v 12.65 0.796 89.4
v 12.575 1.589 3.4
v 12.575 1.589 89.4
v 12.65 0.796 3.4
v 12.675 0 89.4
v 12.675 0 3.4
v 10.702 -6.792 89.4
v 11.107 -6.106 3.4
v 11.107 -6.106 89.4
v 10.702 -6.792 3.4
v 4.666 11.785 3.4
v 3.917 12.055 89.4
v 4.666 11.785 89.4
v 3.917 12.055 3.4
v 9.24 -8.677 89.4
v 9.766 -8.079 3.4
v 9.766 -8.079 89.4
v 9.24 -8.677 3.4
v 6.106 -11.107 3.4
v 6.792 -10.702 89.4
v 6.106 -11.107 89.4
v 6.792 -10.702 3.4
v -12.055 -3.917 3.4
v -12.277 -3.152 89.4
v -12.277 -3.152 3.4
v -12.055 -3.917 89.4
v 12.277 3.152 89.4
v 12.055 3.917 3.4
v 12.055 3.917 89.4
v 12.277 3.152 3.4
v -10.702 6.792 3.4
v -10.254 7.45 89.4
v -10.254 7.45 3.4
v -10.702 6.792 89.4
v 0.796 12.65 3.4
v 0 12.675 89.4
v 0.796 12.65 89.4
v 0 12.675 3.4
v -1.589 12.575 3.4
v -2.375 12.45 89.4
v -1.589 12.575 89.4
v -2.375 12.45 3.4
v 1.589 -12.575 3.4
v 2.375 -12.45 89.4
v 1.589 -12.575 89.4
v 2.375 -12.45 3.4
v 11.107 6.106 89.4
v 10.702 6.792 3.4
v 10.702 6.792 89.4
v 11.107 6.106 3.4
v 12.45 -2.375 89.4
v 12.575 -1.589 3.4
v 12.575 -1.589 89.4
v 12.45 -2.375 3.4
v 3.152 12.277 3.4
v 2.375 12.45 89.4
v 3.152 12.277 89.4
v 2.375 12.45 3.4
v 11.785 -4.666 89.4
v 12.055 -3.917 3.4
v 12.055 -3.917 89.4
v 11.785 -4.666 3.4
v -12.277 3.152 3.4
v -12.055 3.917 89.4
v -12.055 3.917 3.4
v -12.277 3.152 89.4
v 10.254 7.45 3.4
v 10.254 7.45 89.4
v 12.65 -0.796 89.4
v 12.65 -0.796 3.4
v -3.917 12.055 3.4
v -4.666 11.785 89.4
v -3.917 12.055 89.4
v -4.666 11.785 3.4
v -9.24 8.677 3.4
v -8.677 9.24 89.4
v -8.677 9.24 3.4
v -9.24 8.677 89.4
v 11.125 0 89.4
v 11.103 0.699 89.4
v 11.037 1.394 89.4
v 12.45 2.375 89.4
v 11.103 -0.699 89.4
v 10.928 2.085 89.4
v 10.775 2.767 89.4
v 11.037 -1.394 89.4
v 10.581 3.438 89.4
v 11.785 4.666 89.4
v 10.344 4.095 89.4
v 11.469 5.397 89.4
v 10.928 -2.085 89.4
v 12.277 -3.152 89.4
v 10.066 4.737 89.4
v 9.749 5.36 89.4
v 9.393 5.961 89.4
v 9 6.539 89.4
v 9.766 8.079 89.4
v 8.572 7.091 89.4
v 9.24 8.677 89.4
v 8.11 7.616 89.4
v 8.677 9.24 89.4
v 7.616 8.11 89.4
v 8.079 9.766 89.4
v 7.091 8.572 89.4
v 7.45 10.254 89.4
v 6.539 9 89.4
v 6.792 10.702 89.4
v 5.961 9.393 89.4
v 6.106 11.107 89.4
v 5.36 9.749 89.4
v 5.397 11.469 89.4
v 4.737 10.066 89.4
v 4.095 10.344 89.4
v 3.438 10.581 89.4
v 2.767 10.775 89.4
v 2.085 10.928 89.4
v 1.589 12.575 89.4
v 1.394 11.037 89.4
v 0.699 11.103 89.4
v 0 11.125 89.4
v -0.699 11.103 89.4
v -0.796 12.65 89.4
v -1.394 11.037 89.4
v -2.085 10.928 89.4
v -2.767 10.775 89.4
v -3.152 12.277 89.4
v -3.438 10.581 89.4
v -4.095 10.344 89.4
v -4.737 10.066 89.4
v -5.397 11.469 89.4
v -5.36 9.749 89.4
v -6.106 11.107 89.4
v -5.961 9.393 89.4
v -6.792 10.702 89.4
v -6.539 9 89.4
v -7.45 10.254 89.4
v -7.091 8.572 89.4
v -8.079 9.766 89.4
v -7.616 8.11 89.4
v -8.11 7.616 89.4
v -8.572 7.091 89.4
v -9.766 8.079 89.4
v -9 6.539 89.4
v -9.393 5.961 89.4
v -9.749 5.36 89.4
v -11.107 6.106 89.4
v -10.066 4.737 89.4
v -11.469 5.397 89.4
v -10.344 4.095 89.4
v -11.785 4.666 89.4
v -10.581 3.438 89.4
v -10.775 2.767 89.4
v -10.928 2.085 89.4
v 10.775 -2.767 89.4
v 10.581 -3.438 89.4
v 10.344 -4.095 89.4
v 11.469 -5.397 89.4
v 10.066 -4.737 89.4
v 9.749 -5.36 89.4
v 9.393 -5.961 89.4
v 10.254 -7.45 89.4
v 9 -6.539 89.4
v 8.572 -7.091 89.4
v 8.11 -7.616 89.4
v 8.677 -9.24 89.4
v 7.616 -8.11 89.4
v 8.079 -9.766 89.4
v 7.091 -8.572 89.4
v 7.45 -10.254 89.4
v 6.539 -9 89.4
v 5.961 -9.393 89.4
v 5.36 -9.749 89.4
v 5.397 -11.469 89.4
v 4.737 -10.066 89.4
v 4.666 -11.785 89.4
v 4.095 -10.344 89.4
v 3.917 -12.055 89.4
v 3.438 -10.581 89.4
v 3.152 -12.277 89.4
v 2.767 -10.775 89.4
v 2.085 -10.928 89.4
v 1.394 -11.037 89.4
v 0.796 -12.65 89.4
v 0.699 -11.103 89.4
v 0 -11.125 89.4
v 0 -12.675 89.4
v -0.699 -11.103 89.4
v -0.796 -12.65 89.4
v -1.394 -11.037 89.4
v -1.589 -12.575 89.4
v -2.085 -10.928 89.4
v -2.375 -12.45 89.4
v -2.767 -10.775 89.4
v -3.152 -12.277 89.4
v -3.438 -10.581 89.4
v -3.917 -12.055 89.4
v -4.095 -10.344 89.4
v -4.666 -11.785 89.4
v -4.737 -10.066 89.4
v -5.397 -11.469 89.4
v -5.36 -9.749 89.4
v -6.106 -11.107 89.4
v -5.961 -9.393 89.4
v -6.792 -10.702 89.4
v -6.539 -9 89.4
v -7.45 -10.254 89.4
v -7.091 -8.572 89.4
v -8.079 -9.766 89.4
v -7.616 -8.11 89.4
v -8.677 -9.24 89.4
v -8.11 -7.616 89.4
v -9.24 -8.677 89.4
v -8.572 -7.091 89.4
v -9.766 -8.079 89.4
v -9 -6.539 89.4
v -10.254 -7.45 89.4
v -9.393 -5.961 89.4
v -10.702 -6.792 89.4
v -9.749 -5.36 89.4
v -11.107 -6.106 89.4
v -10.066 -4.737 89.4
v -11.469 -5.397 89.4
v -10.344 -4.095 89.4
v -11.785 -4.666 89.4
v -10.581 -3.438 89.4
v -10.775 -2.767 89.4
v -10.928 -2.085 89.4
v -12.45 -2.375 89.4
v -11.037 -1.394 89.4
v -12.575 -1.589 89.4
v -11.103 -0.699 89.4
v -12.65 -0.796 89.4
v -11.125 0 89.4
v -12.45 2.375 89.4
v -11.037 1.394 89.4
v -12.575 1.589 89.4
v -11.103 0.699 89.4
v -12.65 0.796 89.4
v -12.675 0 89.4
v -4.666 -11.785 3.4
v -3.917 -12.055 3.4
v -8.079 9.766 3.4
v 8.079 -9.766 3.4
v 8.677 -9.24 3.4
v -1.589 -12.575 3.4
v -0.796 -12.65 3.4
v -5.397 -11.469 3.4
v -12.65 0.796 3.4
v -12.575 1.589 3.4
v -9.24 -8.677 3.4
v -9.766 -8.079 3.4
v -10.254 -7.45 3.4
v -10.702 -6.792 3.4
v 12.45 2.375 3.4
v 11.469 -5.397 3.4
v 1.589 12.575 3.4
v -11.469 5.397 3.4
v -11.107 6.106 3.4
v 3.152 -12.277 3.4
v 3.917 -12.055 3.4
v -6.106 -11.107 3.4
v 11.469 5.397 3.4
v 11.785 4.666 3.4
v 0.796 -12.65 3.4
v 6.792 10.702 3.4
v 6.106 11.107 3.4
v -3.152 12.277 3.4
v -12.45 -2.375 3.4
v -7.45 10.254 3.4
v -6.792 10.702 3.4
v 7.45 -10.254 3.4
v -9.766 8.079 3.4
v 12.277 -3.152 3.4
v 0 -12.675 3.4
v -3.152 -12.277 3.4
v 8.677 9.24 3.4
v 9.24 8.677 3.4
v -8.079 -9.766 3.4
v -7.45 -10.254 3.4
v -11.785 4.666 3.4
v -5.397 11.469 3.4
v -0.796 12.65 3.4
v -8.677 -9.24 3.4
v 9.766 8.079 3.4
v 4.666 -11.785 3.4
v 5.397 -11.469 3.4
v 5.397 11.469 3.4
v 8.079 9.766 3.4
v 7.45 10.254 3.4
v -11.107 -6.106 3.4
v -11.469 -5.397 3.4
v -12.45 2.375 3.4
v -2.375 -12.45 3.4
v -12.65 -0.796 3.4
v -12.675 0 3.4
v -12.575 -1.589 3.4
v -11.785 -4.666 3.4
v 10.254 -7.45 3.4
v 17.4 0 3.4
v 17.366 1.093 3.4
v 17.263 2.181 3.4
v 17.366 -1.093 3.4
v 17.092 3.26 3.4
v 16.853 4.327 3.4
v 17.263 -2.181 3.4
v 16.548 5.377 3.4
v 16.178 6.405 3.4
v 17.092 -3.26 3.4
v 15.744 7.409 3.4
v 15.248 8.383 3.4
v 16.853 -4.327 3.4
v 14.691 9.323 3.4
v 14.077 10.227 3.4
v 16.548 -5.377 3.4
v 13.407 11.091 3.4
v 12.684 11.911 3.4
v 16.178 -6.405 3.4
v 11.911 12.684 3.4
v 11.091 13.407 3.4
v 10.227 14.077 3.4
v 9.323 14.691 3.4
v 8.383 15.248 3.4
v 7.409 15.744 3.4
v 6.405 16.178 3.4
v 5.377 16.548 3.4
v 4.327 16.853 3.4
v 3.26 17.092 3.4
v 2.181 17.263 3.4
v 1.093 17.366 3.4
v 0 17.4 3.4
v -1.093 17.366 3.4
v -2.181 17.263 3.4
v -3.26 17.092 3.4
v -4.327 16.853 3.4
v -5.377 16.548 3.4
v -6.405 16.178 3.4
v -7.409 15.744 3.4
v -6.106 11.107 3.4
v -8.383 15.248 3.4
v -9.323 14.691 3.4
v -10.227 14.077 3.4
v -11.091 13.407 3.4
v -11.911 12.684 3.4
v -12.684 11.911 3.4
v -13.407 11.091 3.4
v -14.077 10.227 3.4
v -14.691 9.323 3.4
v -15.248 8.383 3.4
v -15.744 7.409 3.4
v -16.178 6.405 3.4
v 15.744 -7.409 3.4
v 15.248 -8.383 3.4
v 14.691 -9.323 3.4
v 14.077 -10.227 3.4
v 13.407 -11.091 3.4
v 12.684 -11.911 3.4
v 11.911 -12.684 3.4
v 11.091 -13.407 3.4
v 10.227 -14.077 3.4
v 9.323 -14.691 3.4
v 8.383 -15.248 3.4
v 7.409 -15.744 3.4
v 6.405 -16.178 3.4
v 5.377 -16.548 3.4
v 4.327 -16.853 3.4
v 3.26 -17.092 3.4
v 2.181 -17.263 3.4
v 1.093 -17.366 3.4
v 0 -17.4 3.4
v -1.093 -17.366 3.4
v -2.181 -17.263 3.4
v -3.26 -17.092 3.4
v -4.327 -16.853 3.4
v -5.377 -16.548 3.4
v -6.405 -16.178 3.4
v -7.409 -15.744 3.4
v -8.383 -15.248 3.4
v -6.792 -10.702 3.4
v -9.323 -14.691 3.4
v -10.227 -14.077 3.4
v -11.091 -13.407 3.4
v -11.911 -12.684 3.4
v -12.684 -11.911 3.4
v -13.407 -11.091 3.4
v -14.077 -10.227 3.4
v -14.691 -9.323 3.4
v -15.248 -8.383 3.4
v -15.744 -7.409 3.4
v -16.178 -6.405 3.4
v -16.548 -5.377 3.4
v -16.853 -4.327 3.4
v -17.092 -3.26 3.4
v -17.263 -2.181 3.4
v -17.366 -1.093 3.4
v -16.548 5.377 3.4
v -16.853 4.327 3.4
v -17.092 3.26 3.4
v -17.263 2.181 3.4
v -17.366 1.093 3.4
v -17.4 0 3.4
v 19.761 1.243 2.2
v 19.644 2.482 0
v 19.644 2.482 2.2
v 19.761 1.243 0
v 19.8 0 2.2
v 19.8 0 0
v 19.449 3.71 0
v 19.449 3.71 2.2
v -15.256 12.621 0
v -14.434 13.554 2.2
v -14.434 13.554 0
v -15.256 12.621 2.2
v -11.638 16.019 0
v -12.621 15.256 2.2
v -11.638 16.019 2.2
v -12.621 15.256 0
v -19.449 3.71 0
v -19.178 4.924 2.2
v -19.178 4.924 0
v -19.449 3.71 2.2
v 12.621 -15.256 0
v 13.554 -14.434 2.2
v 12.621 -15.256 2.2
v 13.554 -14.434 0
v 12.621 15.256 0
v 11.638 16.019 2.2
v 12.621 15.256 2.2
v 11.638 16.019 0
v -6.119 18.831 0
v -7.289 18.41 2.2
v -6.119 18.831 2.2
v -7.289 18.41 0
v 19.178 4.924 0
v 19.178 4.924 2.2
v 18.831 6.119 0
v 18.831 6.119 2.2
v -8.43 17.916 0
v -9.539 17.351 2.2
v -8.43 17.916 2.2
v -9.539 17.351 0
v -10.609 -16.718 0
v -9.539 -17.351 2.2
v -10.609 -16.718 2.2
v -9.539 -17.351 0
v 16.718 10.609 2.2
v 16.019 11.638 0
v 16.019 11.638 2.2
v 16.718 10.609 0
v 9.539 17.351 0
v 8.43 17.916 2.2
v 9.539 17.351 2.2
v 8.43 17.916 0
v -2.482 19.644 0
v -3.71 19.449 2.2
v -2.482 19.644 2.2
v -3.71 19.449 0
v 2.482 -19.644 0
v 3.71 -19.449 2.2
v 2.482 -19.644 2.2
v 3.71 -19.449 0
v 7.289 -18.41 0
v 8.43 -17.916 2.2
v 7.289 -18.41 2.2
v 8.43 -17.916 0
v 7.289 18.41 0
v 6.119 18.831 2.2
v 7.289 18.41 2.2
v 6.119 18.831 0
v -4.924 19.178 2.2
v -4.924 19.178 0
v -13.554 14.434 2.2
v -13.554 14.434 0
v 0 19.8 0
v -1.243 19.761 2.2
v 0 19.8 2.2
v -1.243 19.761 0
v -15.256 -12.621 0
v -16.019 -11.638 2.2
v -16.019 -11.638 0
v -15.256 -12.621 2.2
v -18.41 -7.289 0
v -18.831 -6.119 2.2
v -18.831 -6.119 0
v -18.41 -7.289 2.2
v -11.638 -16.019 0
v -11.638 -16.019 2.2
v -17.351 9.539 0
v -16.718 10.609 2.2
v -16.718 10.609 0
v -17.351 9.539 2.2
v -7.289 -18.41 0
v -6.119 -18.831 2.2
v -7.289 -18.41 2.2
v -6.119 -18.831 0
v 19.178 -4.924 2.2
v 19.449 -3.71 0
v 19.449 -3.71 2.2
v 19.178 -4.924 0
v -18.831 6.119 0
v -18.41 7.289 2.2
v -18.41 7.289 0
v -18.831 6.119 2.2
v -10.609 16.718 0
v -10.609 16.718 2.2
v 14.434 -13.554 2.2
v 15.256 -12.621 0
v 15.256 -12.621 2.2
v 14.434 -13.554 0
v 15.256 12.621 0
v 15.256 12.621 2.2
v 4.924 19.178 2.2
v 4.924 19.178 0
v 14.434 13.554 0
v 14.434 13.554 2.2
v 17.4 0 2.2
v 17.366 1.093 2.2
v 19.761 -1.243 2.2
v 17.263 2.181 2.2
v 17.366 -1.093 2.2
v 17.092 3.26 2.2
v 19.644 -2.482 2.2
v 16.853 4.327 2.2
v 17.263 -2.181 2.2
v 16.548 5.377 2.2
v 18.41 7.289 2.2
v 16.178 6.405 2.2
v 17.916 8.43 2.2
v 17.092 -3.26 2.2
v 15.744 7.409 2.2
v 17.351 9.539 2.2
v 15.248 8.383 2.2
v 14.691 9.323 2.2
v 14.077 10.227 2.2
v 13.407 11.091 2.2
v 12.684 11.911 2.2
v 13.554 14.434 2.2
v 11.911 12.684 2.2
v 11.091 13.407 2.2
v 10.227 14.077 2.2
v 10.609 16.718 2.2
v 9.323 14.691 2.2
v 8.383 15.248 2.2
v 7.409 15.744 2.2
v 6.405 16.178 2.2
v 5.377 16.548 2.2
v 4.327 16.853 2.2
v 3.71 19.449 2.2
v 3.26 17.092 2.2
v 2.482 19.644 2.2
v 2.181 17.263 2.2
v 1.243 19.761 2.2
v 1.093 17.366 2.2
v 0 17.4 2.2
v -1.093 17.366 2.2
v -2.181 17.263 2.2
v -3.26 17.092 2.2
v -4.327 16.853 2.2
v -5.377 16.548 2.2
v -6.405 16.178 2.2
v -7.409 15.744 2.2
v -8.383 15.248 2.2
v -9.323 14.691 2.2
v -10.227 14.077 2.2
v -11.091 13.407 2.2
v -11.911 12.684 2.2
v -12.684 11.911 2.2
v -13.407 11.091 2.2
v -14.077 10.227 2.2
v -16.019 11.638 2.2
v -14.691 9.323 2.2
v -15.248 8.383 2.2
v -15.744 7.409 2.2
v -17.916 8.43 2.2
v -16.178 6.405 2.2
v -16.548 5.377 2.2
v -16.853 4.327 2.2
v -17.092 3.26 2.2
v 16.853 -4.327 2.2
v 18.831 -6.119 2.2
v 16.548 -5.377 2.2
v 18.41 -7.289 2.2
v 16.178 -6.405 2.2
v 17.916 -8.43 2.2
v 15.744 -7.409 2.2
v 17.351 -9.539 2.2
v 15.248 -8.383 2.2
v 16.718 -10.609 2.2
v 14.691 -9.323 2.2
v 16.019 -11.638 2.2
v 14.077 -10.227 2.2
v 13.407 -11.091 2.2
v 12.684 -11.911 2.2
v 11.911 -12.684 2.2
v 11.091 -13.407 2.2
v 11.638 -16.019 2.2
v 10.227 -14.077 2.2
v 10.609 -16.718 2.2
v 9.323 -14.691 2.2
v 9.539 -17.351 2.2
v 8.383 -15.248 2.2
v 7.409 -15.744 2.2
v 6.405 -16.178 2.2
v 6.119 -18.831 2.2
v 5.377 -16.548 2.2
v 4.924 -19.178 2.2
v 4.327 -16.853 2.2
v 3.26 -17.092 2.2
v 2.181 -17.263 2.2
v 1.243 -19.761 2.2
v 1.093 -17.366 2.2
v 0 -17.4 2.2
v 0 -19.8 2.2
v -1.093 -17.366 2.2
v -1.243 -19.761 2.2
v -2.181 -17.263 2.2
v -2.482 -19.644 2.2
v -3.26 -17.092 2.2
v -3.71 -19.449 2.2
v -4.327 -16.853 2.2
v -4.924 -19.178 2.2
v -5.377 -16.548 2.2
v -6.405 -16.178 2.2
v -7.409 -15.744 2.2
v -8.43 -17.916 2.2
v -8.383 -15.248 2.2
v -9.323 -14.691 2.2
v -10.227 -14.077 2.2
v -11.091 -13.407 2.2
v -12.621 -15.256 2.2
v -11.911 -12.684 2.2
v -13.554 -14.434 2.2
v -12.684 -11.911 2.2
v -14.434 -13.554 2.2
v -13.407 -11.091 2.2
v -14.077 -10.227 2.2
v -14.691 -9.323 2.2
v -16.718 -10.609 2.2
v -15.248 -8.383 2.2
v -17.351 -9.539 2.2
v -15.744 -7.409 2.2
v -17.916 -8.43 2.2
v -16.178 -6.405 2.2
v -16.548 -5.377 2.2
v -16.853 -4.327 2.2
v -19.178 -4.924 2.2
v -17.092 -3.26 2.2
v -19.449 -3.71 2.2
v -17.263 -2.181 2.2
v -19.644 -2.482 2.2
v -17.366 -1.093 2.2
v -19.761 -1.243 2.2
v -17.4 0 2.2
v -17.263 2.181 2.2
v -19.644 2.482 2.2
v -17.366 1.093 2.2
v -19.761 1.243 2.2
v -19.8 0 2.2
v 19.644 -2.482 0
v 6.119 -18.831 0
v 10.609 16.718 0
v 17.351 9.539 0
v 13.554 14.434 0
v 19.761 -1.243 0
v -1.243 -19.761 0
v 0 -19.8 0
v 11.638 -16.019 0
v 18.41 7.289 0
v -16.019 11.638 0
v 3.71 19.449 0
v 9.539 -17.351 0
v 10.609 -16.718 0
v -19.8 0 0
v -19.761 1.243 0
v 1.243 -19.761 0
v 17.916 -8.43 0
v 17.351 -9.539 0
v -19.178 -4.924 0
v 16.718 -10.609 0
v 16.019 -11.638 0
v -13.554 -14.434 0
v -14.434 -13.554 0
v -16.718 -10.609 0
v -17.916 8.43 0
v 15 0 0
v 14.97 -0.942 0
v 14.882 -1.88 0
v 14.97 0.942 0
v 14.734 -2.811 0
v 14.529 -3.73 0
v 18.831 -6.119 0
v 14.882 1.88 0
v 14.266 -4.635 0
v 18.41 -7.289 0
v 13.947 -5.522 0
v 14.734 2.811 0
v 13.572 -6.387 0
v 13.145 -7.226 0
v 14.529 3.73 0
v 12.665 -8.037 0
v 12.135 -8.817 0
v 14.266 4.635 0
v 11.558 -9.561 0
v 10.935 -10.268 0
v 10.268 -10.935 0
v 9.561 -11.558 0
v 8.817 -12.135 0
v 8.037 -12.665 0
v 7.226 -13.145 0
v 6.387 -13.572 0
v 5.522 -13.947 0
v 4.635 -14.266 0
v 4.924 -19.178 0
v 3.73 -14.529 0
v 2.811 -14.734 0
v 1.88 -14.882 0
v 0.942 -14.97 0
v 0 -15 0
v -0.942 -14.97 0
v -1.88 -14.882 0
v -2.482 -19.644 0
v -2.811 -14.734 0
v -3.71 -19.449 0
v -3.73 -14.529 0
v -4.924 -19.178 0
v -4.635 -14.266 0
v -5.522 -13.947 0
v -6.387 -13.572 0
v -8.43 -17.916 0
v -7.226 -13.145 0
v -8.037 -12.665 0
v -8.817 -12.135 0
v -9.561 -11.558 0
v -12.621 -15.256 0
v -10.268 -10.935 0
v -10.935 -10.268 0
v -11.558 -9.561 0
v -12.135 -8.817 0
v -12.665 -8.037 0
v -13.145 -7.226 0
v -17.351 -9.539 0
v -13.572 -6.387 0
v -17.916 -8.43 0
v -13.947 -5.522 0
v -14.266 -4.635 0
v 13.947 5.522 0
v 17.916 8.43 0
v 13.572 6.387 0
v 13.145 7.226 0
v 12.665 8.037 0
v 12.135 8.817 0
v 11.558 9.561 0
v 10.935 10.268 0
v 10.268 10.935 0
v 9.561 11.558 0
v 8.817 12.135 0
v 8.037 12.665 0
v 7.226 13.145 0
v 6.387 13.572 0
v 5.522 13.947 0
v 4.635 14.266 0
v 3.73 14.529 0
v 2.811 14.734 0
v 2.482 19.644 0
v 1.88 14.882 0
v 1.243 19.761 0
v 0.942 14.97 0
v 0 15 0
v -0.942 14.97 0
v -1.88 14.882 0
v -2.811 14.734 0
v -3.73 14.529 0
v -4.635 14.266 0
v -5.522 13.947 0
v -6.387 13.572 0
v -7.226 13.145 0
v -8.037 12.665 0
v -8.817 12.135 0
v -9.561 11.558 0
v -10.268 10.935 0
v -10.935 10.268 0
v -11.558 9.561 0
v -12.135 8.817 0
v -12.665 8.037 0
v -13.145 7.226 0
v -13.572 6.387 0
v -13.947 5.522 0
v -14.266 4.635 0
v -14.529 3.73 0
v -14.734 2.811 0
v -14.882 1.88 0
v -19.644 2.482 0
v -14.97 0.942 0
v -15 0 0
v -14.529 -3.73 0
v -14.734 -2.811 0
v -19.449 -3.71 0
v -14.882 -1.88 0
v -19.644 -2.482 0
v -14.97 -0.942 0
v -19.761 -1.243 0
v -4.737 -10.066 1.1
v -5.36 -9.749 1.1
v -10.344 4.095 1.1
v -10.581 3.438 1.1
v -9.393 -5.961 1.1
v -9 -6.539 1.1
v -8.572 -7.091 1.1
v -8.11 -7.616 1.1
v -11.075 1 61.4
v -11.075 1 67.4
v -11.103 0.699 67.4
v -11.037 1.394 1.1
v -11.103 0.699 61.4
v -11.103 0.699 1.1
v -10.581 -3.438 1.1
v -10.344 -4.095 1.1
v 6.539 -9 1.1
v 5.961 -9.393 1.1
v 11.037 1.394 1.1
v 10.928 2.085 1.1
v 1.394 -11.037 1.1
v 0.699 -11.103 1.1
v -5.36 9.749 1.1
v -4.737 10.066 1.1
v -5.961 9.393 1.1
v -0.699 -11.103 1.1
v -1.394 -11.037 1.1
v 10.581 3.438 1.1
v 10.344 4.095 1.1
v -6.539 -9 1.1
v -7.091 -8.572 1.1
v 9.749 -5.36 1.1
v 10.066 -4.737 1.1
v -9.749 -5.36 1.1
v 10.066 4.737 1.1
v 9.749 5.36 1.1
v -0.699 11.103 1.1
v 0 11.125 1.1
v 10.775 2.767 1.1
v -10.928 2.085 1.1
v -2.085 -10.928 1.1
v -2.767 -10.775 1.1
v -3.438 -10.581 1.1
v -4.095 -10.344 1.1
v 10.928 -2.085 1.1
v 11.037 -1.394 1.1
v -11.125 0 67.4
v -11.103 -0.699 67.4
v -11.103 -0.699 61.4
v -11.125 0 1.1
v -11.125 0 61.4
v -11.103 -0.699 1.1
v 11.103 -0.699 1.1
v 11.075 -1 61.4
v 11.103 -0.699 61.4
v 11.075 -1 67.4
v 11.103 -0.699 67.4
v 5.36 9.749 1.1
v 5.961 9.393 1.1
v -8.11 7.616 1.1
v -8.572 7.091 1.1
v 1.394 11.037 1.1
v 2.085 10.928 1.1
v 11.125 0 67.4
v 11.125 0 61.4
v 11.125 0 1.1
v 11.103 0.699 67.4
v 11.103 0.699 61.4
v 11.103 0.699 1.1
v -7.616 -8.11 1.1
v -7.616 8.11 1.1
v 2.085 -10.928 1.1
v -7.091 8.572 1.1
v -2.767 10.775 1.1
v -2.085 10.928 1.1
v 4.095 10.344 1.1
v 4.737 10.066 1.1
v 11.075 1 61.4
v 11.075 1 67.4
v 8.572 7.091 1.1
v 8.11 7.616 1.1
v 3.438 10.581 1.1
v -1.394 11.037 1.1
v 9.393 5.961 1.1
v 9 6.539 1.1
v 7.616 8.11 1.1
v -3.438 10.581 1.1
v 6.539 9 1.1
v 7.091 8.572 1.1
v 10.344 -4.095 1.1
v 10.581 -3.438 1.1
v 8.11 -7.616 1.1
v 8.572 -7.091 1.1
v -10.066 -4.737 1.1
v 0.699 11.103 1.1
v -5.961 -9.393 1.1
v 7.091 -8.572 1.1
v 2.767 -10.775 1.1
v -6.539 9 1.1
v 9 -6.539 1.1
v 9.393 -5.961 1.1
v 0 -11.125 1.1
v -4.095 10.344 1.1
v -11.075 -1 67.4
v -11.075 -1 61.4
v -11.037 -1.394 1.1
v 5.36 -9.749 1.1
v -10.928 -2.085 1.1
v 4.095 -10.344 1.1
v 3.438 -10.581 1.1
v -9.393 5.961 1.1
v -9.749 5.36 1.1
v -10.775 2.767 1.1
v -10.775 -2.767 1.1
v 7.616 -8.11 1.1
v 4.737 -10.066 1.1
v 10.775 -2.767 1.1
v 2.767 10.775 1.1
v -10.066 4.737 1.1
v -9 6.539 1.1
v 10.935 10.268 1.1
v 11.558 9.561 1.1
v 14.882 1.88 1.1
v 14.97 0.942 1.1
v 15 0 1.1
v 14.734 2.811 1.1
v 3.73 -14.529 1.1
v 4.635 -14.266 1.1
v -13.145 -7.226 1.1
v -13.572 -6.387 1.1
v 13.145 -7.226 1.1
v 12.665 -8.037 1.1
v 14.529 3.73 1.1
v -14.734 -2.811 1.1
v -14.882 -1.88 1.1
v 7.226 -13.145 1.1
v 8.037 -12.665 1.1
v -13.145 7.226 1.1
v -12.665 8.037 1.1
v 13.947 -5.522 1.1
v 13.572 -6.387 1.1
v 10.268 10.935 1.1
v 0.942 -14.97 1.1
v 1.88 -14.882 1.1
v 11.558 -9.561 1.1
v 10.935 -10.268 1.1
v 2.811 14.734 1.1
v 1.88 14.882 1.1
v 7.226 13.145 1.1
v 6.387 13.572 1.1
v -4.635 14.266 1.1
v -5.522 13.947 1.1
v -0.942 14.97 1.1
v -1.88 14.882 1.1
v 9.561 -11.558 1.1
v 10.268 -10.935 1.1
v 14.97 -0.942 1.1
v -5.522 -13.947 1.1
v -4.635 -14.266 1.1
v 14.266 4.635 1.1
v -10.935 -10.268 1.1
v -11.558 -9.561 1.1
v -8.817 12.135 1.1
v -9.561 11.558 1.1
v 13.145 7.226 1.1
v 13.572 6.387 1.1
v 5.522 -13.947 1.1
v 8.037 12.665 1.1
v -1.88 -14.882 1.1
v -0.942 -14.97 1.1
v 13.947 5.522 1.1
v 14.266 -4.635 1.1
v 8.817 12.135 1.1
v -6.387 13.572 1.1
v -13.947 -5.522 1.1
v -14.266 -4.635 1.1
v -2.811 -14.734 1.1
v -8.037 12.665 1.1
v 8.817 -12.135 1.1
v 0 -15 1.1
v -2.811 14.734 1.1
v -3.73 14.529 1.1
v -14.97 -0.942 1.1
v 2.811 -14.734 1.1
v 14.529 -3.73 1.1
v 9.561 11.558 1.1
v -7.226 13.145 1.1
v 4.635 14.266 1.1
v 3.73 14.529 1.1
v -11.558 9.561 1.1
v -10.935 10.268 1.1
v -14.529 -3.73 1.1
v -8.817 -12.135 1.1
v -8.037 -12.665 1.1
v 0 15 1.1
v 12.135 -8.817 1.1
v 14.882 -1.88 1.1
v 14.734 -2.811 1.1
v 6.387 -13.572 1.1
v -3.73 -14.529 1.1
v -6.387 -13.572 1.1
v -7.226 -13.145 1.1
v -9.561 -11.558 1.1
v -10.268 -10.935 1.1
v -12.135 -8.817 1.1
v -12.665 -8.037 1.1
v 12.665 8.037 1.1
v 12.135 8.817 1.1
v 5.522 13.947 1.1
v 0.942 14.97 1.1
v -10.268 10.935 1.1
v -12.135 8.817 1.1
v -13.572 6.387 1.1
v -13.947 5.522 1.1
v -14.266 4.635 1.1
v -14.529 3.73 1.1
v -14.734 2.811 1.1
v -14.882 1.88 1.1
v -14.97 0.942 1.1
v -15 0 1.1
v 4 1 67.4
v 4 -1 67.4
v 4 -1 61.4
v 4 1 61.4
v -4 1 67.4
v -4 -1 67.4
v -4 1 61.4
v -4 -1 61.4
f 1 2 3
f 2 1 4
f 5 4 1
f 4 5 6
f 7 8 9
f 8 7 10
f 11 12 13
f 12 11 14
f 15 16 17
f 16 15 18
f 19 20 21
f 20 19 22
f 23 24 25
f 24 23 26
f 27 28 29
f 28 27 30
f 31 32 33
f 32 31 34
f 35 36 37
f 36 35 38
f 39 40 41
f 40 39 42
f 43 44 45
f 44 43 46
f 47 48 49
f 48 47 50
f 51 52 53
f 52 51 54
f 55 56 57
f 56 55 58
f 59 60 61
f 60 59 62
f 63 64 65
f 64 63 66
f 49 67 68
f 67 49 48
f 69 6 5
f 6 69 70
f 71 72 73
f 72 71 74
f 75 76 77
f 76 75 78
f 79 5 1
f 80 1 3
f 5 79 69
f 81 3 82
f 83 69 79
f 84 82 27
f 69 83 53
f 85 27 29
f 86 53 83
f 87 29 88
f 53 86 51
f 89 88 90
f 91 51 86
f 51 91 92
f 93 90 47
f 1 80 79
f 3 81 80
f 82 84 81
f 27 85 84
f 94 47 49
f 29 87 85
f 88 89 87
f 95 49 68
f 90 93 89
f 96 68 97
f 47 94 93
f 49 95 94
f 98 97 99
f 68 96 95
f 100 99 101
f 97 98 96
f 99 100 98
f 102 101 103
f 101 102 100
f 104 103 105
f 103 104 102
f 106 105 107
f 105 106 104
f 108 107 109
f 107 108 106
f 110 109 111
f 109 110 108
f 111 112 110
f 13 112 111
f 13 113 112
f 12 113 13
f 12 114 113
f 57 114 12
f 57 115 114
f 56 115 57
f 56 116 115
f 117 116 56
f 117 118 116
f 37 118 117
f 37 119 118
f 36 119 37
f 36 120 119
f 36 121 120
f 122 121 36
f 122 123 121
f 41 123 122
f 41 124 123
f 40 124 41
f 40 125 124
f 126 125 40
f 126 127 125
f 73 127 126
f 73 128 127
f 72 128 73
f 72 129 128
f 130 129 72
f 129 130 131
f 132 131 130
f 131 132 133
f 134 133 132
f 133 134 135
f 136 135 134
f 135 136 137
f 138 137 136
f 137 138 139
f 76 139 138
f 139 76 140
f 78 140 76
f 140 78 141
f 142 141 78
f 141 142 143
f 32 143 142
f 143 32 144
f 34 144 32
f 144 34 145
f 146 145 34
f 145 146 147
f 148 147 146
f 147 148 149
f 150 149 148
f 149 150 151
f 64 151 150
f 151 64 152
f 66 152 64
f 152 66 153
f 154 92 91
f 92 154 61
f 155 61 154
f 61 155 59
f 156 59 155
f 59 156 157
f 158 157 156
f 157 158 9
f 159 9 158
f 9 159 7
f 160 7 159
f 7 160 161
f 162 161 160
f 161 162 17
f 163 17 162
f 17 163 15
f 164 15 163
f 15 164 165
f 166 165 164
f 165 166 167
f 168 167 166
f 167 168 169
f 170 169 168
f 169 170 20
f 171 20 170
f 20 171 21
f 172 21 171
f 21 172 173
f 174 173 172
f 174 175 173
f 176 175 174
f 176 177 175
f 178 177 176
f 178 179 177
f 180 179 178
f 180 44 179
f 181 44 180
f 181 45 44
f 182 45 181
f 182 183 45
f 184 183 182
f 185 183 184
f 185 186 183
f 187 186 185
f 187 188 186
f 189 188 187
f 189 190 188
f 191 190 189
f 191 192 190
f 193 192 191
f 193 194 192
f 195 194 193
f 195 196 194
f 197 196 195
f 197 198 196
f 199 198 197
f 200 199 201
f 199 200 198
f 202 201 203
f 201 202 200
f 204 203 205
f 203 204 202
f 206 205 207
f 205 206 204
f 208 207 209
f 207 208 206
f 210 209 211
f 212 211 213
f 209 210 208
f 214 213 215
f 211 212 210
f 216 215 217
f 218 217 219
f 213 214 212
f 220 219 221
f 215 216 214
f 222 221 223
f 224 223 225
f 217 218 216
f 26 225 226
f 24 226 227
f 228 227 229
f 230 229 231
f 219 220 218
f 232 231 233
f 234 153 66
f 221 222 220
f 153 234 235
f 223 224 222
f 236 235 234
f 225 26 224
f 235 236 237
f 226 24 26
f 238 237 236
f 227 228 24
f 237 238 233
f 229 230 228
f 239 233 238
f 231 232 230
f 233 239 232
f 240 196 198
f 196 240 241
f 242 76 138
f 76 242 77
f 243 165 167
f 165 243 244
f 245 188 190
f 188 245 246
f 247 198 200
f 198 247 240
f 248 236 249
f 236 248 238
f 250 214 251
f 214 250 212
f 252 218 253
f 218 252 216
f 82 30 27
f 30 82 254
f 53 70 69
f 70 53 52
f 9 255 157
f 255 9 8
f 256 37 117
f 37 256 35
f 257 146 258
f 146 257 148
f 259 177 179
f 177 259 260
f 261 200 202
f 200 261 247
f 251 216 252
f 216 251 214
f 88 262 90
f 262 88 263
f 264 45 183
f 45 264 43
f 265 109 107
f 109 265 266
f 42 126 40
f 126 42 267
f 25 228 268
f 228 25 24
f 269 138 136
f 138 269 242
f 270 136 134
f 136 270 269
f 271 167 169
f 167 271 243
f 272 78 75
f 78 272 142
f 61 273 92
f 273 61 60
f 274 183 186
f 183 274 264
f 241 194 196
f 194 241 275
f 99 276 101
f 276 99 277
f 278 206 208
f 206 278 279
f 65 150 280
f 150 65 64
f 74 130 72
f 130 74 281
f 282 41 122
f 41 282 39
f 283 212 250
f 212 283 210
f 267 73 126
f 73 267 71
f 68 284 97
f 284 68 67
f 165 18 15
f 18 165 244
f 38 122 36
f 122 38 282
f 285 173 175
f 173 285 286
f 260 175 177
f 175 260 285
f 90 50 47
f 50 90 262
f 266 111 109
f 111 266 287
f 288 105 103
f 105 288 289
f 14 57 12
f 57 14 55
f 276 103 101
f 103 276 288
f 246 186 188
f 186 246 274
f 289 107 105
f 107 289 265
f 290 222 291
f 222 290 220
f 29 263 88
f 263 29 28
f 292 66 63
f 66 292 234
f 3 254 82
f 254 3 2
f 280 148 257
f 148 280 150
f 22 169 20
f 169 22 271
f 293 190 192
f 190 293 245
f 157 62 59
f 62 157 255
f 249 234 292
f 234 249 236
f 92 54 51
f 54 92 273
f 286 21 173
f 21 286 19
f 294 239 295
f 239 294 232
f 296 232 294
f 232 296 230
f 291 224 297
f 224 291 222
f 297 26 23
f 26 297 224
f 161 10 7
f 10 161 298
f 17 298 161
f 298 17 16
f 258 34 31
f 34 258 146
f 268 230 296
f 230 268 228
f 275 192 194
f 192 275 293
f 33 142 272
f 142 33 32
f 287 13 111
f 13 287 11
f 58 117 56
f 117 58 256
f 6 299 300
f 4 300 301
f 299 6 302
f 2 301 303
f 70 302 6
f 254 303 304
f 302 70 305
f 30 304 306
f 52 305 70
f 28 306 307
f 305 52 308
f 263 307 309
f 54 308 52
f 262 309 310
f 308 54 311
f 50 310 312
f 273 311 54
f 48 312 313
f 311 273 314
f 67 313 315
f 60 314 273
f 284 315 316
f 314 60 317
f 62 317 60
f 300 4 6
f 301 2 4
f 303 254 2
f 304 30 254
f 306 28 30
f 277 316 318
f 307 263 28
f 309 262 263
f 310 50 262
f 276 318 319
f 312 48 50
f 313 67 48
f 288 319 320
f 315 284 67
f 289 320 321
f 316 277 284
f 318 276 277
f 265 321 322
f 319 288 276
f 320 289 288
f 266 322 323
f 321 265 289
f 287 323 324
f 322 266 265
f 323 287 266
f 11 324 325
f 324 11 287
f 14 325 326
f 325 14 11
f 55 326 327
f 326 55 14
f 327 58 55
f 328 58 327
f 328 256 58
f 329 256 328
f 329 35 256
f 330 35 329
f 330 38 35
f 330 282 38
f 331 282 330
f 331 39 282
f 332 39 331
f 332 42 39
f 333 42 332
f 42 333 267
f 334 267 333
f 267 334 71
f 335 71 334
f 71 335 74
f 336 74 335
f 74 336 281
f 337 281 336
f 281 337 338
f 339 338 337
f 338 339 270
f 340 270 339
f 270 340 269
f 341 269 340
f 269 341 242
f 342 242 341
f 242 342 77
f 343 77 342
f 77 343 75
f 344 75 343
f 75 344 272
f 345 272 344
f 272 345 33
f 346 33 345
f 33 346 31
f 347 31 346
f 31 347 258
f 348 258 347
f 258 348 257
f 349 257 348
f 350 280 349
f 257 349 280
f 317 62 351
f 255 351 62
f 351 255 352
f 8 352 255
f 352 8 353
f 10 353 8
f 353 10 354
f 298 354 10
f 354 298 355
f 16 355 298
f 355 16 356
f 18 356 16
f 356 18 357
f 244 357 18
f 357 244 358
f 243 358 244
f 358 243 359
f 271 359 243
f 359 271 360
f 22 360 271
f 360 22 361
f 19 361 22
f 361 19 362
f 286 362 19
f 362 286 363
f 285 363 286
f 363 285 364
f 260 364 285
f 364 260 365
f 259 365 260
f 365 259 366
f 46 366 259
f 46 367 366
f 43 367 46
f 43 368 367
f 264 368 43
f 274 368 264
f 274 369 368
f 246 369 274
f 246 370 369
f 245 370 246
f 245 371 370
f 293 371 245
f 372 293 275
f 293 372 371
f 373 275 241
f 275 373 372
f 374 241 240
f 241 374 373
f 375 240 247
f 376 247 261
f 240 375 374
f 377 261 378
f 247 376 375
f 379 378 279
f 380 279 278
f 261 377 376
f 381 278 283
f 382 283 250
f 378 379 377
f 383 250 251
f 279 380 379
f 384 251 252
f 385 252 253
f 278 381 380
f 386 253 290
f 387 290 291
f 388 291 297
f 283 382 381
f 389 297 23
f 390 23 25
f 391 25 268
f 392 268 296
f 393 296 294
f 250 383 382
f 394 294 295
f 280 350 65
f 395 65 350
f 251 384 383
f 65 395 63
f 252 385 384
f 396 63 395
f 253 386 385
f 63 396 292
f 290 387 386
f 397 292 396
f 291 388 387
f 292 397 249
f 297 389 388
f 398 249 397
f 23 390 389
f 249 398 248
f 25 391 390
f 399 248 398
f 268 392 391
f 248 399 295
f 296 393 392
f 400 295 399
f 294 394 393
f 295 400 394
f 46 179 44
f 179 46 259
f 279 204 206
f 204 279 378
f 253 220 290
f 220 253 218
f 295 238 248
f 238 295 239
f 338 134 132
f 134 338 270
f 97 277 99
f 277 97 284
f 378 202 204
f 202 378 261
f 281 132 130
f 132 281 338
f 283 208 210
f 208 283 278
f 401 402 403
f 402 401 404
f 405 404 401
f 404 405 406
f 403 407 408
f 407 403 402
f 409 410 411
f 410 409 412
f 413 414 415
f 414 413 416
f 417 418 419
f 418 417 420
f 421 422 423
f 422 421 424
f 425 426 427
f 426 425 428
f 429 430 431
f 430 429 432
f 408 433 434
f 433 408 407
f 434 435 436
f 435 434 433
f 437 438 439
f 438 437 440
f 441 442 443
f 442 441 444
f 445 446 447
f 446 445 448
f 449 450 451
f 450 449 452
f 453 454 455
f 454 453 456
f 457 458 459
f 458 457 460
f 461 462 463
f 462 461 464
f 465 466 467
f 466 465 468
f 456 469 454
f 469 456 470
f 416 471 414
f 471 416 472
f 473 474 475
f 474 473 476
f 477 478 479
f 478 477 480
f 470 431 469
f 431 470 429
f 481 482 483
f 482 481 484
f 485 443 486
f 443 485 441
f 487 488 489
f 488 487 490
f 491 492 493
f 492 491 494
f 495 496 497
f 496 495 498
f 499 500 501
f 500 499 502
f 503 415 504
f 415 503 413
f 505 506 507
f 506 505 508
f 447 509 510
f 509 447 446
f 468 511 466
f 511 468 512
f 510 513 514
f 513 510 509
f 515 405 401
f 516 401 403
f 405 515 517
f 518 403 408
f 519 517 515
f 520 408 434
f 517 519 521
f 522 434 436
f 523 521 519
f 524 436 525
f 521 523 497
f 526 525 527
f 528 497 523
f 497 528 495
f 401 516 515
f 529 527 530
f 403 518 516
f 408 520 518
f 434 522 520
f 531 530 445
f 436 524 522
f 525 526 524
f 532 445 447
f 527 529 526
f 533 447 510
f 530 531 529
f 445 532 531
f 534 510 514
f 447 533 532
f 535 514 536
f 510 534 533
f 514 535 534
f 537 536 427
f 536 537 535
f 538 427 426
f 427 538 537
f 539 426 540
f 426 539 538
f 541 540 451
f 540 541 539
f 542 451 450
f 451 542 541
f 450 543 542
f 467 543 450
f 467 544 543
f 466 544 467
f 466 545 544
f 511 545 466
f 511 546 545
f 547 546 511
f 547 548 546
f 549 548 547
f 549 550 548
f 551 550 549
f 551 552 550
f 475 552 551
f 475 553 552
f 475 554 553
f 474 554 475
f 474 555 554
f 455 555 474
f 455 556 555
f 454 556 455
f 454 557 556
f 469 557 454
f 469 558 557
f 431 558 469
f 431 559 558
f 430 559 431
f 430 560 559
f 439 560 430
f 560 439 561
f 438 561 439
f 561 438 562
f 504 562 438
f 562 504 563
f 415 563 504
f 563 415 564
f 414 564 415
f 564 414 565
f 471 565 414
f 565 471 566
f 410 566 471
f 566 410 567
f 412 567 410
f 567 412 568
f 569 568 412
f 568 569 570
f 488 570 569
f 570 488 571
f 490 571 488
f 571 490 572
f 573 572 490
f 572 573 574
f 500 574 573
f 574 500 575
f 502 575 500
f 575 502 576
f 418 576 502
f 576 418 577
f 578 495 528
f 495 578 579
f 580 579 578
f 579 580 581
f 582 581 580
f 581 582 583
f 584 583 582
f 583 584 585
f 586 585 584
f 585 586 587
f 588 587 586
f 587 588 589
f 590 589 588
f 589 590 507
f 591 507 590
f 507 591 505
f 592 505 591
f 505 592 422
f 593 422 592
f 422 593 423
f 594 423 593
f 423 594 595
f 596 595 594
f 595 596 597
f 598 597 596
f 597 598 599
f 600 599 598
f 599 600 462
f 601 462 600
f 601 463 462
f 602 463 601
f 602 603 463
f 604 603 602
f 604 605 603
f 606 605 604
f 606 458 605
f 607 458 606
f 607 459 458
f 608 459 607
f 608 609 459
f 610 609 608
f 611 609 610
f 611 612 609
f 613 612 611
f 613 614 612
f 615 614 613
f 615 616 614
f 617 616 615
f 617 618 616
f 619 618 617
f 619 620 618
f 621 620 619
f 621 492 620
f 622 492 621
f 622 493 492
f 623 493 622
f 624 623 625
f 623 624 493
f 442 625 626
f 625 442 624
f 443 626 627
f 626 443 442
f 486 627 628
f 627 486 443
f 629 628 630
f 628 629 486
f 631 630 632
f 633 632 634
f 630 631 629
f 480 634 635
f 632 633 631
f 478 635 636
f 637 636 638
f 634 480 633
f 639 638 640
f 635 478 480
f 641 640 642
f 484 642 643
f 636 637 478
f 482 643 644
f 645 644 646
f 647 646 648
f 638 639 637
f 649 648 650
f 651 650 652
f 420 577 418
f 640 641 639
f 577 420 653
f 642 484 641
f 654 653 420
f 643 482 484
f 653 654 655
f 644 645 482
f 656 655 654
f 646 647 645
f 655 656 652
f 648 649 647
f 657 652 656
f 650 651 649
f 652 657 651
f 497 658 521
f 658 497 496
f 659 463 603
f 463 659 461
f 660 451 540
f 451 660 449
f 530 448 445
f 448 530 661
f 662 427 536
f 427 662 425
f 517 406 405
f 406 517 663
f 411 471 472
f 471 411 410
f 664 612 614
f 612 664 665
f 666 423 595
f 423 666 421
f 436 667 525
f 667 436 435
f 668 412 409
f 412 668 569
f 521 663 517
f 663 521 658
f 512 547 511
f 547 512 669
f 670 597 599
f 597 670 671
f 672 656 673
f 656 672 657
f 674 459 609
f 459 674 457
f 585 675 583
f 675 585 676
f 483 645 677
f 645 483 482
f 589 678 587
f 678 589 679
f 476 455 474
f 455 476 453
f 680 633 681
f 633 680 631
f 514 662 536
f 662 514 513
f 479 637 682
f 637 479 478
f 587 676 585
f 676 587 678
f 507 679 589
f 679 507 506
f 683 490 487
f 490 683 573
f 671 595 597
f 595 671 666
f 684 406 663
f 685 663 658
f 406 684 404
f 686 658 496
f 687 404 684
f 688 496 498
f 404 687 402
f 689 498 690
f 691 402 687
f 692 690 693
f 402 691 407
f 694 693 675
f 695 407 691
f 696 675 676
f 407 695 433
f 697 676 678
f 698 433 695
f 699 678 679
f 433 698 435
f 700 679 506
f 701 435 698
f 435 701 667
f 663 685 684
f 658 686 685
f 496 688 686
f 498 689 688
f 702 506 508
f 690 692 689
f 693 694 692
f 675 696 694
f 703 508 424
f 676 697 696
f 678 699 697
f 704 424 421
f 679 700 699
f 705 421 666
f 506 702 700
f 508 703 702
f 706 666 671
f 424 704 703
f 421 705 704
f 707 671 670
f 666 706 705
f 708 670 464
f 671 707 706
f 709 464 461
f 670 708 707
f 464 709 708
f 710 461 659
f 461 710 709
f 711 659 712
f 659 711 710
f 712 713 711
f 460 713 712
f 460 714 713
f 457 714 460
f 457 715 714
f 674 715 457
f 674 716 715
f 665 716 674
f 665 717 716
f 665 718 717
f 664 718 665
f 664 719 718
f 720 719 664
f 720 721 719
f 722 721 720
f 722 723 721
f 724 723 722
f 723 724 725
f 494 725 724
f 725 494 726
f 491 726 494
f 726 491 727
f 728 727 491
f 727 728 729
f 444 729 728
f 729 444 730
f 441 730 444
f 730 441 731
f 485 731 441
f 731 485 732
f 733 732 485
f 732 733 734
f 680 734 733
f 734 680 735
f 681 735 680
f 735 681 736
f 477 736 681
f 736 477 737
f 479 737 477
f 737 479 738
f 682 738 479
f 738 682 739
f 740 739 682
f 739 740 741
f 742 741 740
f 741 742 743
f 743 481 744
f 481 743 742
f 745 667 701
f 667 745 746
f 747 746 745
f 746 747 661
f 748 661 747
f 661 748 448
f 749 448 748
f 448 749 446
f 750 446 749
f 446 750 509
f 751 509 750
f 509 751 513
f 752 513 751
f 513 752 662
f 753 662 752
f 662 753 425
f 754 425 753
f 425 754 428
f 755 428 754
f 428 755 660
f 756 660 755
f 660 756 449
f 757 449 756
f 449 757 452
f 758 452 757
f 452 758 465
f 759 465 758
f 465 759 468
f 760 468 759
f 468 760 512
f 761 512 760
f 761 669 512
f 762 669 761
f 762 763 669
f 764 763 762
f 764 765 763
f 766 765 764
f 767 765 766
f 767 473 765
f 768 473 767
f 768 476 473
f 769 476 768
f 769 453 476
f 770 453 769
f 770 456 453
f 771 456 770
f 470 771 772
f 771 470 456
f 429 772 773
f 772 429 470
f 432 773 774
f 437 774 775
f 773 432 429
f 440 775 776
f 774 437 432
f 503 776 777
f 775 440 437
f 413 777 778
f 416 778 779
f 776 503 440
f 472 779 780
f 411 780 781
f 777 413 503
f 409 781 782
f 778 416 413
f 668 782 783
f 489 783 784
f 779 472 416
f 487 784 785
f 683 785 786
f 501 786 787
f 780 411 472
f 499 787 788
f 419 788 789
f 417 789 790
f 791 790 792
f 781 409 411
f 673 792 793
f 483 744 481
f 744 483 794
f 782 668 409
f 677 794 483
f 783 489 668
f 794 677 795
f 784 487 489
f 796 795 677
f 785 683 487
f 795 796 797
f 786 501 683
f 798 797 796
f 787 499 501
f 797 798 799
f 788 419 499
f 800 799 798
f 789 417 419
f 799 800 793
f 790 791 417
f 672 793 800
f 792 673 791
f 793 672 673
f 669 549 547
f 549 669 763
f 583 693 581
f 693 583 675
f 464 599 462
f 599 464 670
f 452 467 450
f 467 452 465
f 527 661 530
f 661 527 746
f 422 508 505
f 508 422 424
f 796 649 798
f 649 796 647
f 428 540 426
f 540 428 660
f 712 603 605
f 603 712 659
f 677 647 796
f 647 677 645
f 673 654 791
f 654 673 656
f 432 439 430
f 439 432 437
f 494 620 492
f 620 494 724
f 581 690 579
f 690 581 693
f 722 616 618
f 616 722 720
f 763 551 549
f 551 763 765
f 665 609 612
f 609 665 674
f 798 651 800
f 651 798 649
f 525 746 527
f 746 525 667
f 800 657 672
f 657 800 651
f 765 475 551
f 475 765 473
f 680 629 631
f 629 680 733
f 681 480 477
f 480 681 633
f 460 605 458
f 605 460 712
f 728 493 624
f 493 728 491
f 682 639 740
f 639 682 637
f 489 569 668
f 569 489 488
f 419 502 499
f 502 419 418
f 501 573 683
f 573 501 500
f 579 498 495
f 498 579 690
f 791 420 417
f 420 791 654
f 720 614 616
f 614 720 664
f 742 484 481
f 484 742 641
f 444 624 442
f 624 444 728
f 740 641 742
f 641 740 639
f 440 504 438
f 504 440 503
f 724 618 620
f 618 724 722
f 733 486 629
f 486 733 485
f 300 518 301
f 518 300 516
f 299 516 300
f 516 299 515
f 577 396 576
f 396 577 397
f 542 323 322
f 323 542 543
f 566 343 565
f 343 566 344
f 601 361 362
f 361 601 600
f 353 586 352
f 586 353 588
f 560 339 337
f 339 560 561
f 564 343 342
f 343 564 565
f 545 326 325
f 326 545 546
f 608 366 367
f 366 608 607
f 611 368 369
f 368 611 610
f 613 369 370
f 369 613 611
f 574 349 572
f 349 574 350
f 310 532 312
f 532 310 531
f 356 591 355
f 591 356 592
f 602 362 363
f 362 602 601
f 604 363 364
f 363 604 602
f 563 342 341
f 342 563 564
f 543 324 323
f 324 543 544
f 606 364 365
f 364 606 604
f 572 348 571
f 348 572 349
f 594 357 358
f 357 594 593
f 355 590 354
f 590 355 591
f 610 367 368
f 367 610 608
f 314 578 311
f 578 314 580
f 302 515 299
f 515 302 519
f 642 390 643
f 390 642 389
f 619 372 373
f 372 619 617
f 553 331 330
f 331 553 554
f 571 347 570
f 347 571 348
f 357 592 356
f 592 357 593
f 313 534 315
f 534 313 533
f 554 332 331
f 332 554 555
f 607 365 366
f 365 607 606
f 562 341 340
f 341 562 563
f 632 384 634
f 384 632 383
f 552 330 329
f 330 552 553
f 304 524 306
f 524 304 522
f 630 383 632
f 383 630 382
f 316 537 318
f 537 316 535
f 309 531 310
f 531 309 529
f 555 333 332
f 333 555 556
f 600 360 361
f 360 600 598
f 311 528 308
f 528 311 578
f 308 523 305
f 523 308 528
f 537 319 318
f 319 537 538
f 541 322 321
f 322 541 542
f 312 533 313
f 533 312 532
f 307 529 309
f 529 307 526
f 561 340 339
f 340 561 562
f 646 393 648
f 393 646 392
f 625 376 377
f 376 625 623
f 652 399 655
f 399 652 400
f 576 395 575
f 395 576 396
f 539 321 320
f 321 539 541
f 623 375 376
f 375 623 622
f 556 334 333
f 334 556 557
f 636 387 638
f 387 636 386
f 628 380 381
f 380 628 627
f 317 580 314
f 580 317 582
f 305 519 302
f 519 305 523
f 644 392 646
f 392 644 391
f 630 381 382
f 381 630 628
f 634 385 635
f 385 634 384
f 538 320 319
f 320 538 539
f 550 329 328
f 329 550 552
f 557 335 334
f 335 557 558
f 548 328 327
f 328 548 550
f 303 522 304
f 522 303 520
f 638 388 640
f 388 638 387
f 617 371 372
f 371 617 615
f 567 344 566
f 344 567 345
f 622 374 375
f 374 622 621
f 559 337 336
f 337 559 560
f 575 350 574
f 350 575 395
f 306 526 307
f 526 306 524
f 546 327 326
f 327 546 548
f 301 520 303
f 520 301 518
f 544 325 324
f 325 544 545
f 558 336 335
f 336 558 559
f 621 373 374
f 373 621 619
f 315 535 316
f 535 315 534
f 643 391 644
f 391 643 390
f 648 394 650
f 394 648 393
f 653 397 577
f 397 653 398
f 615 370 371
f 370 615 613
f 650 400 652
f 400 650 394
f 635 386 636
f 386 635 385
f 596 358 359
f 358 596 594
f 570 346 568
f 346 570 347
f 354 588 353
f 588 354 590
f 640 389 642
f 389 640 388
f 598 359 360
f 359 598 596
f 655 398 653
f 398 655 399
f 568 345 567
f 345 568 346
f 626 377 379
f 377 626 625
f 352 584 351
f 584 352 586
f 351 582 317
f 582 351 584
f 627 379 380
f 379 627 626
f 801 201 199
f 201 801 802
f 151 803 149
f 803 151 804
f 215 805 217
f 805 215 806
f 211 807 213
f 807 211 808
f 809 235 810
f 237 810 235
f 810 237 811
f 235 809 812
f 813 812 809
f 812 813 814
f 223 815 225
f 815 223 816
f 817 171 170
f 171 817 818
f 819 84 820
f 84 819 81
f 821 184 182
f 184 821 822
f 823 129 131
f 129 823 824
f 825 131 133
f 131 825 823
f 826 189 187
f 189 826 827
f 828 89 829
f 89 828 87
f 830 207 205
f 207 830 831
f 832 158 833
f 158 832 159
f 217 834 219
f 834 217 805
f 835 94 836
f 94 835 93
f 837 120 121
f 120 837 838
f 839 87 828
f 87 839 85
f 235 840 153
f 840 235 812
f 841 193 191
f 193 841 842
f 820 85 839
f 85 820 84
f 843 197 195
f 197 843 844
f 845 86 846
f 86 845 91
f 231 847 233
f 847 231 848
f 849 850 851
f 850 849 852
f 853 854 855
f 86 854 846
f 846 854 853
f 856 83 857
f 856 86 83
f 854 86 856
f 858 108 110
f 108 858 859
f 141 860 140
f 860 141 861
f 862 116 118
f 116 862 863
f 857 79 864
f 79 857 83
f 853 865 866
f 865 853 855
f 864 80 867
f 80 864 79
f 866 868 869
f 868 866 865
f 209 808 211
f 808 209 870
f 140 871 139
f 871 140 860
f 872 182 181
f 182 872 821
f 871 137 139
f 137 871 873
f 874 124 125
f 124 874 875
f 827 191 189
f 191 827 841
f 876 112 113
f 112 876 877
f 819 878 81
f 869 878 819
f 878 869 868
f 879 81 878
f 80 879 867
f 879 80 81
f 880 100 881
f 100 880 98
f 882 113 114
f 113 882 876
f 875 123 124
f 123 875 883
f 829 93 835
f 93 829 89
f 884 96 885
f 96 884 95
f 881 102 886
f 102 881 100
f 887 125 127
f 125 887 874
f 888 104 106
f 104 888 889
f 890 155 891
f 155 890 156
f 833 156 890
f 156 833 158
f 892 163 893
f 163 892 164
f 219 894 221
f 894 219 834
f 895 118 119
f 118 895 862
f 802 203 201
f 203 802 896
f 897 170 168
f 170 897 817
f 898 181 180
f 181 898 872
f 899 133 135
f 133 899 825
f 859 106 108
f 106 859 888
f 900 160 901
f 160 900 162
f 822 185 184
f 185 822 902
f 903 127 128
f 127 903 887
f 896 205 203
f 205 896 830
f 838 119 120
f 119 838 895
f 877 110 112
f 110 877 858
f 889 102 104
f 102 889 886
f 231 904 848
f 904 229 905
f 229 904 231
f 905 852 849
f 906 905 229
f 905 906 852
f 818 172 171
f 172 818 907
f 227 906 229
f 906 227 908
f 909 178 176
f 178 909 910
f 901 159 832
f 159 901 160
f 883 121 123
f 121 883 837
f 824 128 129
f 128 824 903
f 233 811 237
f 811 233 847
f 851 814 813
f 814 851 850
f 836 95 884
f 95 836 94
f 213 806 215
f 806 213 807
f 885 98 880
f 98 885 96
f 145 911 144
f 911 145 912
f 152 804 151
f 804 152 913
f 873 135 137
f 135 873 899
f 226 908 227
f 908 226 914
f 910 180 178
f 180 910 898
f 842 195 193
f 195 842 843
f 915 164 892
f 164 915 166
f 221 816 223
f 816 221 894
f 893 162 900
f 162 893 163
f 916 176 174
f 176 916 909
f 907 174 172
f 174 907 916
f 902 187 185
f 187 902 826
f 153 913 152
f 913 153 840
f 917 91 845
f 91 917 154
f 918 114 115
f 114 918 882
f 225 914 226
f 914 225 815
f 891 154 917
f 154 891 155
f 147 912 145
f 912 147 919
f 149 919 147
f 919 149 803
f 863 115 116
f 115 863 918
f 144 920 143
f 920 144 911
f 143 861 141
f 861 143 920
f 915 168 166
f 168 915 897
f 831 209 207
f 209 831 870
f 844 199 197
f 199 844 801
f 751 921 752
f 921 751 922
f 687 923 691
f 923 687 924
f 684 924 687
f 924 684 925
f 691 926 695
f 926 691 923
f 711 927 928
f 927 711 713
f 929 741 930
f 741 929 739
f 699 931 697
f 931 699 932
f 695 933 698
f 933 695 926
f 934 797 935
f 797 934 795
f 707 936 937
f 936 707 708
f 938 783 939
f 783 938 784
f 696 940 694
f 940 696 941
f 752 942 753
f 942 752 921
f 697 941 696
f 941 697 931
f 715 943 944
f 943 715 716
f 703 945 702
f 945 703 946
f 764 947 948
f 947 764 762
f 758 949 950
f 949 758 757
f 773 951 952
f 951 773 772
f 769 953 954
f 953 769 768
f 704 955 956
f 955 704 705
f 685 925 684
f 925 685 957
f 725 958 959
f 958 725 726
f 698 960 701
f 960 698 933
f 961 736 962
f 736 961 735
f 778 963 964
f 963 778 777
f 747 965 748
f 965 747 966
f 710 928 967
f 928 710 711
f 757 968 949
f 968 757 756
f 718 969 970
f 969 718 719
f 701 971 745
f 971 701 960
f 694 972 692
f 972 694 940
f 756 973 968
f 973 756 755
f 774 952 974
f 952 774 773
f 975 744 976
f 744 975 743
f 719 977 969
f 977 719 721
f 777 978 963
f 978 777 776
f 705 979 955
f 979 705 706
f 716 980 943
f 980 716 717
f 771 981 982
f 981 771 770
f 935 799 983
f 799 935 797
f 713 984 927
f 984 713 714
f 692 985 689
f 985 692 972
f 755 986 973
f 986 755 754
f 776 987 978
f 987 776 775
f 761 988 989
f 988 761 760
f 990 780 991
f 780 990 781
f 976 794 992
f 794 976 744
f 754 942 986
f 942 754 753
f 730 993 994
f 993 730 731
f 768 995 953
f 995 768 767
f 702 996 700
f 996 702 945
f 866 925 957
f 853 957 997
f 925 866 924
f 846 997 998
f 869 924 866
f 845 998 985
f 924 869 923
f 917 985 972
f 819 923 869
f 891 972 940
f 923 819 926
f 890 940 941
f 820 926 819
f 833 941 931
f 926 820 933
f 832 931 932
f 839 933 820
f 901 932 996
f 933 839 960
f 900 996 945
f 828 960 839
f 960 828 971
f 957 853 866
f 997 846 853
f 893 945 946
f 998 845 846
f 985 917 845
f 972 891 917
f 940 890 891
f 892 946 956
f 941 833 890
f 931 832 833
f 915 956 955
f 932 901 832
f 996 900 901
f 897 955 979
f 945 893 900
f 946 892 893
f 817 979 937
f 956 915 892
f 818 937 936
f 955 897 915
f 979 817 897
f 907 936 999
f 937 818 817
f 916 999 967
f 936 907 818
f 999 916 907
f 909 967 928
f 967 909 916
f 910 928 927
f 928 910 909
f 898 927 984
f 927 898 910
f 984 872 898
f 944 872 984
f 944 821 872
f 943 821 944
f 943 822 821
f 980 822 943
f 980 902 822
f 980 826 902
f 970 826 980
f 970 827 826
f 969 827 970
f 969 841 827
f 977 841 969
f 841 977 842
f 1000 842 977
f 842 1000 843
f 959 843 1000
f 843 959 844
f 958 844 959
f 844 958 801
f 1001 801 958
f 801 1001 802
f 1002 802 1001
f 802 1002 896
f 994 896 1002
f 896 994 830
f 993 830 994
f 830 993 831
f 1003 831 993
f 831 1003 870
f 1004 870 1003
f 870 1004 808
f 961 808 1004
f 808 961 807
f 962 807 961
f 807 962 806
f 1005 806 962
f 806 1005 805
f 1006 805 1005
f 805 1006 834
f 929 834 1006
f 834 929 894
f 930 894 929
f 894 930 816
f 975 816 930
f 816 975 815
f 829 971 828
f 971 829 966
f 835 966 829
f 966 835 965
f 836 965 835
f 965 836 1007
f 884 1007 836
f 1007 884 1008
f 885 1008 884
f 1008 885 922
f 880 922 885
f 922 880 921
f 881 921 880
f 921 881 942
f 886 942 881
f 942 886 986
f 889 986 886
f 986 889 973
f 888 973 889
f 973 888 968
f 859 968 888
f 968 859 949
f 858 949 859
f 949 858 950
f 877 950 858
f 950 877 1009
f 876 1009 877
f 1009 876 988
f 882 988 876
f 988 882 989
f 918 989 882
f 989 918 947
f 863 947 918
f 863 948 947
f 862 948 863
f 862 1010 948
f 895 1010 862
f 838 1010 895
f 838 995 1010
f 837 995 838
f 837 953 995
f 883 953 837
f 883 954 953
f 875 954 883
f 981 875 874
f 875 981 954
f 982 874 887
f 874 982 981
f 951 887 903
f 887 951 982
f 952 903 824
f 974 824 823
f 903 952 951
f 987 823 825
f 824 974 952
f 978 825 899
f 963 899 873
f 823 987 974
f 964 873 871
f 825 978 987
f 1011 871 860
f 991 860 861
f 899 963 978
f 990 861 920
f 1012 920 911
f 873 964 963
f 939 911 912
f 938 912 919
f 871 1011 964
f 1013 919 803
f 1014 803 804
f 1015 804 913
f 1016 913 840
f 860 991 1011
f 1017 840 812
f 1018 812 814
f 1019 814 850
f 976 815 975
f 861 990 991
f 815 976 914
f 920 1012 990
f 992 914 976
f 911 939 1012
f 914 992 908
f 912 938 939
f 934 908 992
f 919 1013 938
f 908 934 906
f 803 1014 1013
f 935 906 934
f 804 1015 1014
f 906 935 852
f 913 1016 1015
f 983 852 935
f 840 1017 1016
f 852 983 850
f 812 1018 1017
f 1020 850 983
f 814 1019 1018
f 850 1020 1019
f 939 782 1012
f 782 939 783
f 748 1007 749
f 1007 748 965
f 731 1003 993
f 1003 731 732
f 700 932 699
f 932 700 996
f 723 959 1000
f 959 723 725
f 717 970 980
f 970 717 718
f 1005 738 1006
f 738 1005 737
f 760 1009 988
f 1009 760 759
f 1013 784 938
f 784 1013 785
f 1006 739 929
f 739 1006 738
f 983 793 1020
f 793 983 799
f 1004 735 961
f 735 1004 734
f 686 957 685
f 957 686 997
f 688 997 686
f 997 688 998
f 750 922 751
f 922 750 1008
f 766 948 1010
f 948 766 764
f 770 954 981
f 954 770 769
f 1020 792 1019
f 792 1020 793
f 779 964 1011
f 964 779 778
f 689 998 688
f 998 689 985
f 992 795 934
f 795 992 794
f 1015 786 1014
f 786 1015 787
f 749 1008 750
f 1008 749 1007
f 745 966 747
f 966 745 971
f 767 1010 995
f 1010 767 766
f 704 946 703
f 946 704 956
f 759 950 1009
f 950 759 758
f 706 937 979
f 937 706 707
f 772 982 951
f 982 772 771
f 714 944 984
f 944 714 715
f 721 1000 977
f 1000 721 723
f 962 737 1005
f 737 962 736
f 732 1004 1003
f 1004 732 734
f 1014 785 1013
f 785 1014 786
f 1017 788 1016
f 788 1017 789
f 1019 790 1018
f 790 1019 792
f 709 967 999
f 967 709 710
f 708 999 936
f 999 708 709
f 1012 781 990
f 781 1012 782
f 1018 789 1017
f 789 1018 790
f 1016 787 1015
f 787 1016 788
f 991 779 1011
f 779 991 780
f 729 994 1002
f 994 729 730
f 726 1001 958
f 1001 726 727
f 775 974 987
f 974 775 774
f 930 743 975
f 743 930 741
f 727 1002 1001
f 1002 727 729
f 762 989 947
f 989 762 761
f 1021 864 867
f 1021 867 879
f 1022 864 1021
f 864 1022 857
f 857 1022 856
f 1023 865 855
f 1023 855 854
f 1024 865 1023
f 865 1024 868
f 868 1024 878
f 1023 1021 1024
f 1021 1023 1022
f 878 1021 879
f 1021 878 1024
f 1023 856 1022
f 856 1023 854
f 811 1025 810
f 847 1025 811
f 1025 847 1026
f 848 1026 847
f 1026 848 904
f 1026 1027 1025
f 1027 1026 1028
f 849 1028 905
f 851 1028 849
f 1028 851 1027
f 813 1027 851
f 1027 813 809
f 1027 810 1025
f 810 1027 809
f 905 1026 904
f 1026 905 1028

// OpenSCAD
/* Setup parameters */
// The number of 35mm reels to fit in the tube. Rule of thumb: 1 medium format reel = ~1.5 35mm reels (round up to 2).
Number_Of_Reels = 2;

/* [Hidden] */
$fn = 100;

THIRTYFIVEMM_REEL_HEIGHT = 42;
TUBE_LENGTH = 43 * Number_Of_Reels;
TUBE_THICKNESS = 1.55;
TUBE_OUTER_DIAMETER = 25.35;
TUBE_INNER_DIAMETER = TUBE_OUTER_DIAMETER - TUBE_THICKNESS * 2;
BASE_HEIGHT_LOWER = 2.2;
BASE_HEIGHT_HIGHER = 3.4 - BASE_HEIGHT_LOWER;
BASE_LOWER_DIAMETER = 39.6;
BASE_HIGHER_DIAMETER = 34.8;
INNER_BOTTOM_CUTOUT_DIAMETER = 30;
ROTARY_STICK_HOLDER_LENGTH = (TUBE_INNER_DIAMETER - 8) / 2;
ROTARY_STICK_HOLDER_WIDTH = 2;
ROTARY_STICK_HOLDER_HEIGHT = 6;

module tube(length, outer_diameter, inner_diameter, thickness) {
    total_base_height = BASE_HEIGHT_LOWER + BASE_HEIGHT_HIGHER;

    union() {
        difference() {
            union() {
                // Main tube positioned so it starts at top of bases
                translate([0, 0, total_base_height + length / 2]) cylinder(h=length, d=outer_diameter, center=true, $fn=100);
                // Lower base at z=0
                cylinder(h=BASE_HEIGHT_LOWER, d=BASE_LOWER_DIAMETER, $fn=100);
                // Higher base on top of lower base
                translate([0, 0, BASE_HEIGHT_LOWER]) cylinder(h=BASE_HEIGHT_HIGHER, d=BASE_HIGHER_DIAMETER, $fn=100);
            }
            // Inner cutout for entire tube length plus bases
            cylinder(h=total_base_height + length + 0.1, d=inner_diameter, $fn=100);
            // Bottom cutout
            cylinder(h=BASE_HEIGHT_LOWER / 2, d=INNER_BOTTOM_CUTOUT_DIAMETER, $fn=100);
        }

        // Rotary stick holders - two opposite each other inside the tube near the top
        for (angle = [0, 180]) {
            rotate([0, 0, angle])
                translate([inner_diameter / 2 - ROTARY_STICK_HOLDER_LENGTH, -ROTARY_STICK_HOLDER_WIDTH / 2, total_base_height + length - 22 - ROTARY_STICK_HOLDER_HEIGHT])
                    cube([ROTARY_STICK_HOLDER_LENGTH, ROTARY_STICK_HOLDER_WIDTH, ROTARY_STICK_HOLDER_HEIGHT]);
        }
    }
}

tube(TUBE_LENGTH, TUBE_OUTER_DIAMETER, TUBE_INNER_DIAMETER, TUBE_THICKNESS);
